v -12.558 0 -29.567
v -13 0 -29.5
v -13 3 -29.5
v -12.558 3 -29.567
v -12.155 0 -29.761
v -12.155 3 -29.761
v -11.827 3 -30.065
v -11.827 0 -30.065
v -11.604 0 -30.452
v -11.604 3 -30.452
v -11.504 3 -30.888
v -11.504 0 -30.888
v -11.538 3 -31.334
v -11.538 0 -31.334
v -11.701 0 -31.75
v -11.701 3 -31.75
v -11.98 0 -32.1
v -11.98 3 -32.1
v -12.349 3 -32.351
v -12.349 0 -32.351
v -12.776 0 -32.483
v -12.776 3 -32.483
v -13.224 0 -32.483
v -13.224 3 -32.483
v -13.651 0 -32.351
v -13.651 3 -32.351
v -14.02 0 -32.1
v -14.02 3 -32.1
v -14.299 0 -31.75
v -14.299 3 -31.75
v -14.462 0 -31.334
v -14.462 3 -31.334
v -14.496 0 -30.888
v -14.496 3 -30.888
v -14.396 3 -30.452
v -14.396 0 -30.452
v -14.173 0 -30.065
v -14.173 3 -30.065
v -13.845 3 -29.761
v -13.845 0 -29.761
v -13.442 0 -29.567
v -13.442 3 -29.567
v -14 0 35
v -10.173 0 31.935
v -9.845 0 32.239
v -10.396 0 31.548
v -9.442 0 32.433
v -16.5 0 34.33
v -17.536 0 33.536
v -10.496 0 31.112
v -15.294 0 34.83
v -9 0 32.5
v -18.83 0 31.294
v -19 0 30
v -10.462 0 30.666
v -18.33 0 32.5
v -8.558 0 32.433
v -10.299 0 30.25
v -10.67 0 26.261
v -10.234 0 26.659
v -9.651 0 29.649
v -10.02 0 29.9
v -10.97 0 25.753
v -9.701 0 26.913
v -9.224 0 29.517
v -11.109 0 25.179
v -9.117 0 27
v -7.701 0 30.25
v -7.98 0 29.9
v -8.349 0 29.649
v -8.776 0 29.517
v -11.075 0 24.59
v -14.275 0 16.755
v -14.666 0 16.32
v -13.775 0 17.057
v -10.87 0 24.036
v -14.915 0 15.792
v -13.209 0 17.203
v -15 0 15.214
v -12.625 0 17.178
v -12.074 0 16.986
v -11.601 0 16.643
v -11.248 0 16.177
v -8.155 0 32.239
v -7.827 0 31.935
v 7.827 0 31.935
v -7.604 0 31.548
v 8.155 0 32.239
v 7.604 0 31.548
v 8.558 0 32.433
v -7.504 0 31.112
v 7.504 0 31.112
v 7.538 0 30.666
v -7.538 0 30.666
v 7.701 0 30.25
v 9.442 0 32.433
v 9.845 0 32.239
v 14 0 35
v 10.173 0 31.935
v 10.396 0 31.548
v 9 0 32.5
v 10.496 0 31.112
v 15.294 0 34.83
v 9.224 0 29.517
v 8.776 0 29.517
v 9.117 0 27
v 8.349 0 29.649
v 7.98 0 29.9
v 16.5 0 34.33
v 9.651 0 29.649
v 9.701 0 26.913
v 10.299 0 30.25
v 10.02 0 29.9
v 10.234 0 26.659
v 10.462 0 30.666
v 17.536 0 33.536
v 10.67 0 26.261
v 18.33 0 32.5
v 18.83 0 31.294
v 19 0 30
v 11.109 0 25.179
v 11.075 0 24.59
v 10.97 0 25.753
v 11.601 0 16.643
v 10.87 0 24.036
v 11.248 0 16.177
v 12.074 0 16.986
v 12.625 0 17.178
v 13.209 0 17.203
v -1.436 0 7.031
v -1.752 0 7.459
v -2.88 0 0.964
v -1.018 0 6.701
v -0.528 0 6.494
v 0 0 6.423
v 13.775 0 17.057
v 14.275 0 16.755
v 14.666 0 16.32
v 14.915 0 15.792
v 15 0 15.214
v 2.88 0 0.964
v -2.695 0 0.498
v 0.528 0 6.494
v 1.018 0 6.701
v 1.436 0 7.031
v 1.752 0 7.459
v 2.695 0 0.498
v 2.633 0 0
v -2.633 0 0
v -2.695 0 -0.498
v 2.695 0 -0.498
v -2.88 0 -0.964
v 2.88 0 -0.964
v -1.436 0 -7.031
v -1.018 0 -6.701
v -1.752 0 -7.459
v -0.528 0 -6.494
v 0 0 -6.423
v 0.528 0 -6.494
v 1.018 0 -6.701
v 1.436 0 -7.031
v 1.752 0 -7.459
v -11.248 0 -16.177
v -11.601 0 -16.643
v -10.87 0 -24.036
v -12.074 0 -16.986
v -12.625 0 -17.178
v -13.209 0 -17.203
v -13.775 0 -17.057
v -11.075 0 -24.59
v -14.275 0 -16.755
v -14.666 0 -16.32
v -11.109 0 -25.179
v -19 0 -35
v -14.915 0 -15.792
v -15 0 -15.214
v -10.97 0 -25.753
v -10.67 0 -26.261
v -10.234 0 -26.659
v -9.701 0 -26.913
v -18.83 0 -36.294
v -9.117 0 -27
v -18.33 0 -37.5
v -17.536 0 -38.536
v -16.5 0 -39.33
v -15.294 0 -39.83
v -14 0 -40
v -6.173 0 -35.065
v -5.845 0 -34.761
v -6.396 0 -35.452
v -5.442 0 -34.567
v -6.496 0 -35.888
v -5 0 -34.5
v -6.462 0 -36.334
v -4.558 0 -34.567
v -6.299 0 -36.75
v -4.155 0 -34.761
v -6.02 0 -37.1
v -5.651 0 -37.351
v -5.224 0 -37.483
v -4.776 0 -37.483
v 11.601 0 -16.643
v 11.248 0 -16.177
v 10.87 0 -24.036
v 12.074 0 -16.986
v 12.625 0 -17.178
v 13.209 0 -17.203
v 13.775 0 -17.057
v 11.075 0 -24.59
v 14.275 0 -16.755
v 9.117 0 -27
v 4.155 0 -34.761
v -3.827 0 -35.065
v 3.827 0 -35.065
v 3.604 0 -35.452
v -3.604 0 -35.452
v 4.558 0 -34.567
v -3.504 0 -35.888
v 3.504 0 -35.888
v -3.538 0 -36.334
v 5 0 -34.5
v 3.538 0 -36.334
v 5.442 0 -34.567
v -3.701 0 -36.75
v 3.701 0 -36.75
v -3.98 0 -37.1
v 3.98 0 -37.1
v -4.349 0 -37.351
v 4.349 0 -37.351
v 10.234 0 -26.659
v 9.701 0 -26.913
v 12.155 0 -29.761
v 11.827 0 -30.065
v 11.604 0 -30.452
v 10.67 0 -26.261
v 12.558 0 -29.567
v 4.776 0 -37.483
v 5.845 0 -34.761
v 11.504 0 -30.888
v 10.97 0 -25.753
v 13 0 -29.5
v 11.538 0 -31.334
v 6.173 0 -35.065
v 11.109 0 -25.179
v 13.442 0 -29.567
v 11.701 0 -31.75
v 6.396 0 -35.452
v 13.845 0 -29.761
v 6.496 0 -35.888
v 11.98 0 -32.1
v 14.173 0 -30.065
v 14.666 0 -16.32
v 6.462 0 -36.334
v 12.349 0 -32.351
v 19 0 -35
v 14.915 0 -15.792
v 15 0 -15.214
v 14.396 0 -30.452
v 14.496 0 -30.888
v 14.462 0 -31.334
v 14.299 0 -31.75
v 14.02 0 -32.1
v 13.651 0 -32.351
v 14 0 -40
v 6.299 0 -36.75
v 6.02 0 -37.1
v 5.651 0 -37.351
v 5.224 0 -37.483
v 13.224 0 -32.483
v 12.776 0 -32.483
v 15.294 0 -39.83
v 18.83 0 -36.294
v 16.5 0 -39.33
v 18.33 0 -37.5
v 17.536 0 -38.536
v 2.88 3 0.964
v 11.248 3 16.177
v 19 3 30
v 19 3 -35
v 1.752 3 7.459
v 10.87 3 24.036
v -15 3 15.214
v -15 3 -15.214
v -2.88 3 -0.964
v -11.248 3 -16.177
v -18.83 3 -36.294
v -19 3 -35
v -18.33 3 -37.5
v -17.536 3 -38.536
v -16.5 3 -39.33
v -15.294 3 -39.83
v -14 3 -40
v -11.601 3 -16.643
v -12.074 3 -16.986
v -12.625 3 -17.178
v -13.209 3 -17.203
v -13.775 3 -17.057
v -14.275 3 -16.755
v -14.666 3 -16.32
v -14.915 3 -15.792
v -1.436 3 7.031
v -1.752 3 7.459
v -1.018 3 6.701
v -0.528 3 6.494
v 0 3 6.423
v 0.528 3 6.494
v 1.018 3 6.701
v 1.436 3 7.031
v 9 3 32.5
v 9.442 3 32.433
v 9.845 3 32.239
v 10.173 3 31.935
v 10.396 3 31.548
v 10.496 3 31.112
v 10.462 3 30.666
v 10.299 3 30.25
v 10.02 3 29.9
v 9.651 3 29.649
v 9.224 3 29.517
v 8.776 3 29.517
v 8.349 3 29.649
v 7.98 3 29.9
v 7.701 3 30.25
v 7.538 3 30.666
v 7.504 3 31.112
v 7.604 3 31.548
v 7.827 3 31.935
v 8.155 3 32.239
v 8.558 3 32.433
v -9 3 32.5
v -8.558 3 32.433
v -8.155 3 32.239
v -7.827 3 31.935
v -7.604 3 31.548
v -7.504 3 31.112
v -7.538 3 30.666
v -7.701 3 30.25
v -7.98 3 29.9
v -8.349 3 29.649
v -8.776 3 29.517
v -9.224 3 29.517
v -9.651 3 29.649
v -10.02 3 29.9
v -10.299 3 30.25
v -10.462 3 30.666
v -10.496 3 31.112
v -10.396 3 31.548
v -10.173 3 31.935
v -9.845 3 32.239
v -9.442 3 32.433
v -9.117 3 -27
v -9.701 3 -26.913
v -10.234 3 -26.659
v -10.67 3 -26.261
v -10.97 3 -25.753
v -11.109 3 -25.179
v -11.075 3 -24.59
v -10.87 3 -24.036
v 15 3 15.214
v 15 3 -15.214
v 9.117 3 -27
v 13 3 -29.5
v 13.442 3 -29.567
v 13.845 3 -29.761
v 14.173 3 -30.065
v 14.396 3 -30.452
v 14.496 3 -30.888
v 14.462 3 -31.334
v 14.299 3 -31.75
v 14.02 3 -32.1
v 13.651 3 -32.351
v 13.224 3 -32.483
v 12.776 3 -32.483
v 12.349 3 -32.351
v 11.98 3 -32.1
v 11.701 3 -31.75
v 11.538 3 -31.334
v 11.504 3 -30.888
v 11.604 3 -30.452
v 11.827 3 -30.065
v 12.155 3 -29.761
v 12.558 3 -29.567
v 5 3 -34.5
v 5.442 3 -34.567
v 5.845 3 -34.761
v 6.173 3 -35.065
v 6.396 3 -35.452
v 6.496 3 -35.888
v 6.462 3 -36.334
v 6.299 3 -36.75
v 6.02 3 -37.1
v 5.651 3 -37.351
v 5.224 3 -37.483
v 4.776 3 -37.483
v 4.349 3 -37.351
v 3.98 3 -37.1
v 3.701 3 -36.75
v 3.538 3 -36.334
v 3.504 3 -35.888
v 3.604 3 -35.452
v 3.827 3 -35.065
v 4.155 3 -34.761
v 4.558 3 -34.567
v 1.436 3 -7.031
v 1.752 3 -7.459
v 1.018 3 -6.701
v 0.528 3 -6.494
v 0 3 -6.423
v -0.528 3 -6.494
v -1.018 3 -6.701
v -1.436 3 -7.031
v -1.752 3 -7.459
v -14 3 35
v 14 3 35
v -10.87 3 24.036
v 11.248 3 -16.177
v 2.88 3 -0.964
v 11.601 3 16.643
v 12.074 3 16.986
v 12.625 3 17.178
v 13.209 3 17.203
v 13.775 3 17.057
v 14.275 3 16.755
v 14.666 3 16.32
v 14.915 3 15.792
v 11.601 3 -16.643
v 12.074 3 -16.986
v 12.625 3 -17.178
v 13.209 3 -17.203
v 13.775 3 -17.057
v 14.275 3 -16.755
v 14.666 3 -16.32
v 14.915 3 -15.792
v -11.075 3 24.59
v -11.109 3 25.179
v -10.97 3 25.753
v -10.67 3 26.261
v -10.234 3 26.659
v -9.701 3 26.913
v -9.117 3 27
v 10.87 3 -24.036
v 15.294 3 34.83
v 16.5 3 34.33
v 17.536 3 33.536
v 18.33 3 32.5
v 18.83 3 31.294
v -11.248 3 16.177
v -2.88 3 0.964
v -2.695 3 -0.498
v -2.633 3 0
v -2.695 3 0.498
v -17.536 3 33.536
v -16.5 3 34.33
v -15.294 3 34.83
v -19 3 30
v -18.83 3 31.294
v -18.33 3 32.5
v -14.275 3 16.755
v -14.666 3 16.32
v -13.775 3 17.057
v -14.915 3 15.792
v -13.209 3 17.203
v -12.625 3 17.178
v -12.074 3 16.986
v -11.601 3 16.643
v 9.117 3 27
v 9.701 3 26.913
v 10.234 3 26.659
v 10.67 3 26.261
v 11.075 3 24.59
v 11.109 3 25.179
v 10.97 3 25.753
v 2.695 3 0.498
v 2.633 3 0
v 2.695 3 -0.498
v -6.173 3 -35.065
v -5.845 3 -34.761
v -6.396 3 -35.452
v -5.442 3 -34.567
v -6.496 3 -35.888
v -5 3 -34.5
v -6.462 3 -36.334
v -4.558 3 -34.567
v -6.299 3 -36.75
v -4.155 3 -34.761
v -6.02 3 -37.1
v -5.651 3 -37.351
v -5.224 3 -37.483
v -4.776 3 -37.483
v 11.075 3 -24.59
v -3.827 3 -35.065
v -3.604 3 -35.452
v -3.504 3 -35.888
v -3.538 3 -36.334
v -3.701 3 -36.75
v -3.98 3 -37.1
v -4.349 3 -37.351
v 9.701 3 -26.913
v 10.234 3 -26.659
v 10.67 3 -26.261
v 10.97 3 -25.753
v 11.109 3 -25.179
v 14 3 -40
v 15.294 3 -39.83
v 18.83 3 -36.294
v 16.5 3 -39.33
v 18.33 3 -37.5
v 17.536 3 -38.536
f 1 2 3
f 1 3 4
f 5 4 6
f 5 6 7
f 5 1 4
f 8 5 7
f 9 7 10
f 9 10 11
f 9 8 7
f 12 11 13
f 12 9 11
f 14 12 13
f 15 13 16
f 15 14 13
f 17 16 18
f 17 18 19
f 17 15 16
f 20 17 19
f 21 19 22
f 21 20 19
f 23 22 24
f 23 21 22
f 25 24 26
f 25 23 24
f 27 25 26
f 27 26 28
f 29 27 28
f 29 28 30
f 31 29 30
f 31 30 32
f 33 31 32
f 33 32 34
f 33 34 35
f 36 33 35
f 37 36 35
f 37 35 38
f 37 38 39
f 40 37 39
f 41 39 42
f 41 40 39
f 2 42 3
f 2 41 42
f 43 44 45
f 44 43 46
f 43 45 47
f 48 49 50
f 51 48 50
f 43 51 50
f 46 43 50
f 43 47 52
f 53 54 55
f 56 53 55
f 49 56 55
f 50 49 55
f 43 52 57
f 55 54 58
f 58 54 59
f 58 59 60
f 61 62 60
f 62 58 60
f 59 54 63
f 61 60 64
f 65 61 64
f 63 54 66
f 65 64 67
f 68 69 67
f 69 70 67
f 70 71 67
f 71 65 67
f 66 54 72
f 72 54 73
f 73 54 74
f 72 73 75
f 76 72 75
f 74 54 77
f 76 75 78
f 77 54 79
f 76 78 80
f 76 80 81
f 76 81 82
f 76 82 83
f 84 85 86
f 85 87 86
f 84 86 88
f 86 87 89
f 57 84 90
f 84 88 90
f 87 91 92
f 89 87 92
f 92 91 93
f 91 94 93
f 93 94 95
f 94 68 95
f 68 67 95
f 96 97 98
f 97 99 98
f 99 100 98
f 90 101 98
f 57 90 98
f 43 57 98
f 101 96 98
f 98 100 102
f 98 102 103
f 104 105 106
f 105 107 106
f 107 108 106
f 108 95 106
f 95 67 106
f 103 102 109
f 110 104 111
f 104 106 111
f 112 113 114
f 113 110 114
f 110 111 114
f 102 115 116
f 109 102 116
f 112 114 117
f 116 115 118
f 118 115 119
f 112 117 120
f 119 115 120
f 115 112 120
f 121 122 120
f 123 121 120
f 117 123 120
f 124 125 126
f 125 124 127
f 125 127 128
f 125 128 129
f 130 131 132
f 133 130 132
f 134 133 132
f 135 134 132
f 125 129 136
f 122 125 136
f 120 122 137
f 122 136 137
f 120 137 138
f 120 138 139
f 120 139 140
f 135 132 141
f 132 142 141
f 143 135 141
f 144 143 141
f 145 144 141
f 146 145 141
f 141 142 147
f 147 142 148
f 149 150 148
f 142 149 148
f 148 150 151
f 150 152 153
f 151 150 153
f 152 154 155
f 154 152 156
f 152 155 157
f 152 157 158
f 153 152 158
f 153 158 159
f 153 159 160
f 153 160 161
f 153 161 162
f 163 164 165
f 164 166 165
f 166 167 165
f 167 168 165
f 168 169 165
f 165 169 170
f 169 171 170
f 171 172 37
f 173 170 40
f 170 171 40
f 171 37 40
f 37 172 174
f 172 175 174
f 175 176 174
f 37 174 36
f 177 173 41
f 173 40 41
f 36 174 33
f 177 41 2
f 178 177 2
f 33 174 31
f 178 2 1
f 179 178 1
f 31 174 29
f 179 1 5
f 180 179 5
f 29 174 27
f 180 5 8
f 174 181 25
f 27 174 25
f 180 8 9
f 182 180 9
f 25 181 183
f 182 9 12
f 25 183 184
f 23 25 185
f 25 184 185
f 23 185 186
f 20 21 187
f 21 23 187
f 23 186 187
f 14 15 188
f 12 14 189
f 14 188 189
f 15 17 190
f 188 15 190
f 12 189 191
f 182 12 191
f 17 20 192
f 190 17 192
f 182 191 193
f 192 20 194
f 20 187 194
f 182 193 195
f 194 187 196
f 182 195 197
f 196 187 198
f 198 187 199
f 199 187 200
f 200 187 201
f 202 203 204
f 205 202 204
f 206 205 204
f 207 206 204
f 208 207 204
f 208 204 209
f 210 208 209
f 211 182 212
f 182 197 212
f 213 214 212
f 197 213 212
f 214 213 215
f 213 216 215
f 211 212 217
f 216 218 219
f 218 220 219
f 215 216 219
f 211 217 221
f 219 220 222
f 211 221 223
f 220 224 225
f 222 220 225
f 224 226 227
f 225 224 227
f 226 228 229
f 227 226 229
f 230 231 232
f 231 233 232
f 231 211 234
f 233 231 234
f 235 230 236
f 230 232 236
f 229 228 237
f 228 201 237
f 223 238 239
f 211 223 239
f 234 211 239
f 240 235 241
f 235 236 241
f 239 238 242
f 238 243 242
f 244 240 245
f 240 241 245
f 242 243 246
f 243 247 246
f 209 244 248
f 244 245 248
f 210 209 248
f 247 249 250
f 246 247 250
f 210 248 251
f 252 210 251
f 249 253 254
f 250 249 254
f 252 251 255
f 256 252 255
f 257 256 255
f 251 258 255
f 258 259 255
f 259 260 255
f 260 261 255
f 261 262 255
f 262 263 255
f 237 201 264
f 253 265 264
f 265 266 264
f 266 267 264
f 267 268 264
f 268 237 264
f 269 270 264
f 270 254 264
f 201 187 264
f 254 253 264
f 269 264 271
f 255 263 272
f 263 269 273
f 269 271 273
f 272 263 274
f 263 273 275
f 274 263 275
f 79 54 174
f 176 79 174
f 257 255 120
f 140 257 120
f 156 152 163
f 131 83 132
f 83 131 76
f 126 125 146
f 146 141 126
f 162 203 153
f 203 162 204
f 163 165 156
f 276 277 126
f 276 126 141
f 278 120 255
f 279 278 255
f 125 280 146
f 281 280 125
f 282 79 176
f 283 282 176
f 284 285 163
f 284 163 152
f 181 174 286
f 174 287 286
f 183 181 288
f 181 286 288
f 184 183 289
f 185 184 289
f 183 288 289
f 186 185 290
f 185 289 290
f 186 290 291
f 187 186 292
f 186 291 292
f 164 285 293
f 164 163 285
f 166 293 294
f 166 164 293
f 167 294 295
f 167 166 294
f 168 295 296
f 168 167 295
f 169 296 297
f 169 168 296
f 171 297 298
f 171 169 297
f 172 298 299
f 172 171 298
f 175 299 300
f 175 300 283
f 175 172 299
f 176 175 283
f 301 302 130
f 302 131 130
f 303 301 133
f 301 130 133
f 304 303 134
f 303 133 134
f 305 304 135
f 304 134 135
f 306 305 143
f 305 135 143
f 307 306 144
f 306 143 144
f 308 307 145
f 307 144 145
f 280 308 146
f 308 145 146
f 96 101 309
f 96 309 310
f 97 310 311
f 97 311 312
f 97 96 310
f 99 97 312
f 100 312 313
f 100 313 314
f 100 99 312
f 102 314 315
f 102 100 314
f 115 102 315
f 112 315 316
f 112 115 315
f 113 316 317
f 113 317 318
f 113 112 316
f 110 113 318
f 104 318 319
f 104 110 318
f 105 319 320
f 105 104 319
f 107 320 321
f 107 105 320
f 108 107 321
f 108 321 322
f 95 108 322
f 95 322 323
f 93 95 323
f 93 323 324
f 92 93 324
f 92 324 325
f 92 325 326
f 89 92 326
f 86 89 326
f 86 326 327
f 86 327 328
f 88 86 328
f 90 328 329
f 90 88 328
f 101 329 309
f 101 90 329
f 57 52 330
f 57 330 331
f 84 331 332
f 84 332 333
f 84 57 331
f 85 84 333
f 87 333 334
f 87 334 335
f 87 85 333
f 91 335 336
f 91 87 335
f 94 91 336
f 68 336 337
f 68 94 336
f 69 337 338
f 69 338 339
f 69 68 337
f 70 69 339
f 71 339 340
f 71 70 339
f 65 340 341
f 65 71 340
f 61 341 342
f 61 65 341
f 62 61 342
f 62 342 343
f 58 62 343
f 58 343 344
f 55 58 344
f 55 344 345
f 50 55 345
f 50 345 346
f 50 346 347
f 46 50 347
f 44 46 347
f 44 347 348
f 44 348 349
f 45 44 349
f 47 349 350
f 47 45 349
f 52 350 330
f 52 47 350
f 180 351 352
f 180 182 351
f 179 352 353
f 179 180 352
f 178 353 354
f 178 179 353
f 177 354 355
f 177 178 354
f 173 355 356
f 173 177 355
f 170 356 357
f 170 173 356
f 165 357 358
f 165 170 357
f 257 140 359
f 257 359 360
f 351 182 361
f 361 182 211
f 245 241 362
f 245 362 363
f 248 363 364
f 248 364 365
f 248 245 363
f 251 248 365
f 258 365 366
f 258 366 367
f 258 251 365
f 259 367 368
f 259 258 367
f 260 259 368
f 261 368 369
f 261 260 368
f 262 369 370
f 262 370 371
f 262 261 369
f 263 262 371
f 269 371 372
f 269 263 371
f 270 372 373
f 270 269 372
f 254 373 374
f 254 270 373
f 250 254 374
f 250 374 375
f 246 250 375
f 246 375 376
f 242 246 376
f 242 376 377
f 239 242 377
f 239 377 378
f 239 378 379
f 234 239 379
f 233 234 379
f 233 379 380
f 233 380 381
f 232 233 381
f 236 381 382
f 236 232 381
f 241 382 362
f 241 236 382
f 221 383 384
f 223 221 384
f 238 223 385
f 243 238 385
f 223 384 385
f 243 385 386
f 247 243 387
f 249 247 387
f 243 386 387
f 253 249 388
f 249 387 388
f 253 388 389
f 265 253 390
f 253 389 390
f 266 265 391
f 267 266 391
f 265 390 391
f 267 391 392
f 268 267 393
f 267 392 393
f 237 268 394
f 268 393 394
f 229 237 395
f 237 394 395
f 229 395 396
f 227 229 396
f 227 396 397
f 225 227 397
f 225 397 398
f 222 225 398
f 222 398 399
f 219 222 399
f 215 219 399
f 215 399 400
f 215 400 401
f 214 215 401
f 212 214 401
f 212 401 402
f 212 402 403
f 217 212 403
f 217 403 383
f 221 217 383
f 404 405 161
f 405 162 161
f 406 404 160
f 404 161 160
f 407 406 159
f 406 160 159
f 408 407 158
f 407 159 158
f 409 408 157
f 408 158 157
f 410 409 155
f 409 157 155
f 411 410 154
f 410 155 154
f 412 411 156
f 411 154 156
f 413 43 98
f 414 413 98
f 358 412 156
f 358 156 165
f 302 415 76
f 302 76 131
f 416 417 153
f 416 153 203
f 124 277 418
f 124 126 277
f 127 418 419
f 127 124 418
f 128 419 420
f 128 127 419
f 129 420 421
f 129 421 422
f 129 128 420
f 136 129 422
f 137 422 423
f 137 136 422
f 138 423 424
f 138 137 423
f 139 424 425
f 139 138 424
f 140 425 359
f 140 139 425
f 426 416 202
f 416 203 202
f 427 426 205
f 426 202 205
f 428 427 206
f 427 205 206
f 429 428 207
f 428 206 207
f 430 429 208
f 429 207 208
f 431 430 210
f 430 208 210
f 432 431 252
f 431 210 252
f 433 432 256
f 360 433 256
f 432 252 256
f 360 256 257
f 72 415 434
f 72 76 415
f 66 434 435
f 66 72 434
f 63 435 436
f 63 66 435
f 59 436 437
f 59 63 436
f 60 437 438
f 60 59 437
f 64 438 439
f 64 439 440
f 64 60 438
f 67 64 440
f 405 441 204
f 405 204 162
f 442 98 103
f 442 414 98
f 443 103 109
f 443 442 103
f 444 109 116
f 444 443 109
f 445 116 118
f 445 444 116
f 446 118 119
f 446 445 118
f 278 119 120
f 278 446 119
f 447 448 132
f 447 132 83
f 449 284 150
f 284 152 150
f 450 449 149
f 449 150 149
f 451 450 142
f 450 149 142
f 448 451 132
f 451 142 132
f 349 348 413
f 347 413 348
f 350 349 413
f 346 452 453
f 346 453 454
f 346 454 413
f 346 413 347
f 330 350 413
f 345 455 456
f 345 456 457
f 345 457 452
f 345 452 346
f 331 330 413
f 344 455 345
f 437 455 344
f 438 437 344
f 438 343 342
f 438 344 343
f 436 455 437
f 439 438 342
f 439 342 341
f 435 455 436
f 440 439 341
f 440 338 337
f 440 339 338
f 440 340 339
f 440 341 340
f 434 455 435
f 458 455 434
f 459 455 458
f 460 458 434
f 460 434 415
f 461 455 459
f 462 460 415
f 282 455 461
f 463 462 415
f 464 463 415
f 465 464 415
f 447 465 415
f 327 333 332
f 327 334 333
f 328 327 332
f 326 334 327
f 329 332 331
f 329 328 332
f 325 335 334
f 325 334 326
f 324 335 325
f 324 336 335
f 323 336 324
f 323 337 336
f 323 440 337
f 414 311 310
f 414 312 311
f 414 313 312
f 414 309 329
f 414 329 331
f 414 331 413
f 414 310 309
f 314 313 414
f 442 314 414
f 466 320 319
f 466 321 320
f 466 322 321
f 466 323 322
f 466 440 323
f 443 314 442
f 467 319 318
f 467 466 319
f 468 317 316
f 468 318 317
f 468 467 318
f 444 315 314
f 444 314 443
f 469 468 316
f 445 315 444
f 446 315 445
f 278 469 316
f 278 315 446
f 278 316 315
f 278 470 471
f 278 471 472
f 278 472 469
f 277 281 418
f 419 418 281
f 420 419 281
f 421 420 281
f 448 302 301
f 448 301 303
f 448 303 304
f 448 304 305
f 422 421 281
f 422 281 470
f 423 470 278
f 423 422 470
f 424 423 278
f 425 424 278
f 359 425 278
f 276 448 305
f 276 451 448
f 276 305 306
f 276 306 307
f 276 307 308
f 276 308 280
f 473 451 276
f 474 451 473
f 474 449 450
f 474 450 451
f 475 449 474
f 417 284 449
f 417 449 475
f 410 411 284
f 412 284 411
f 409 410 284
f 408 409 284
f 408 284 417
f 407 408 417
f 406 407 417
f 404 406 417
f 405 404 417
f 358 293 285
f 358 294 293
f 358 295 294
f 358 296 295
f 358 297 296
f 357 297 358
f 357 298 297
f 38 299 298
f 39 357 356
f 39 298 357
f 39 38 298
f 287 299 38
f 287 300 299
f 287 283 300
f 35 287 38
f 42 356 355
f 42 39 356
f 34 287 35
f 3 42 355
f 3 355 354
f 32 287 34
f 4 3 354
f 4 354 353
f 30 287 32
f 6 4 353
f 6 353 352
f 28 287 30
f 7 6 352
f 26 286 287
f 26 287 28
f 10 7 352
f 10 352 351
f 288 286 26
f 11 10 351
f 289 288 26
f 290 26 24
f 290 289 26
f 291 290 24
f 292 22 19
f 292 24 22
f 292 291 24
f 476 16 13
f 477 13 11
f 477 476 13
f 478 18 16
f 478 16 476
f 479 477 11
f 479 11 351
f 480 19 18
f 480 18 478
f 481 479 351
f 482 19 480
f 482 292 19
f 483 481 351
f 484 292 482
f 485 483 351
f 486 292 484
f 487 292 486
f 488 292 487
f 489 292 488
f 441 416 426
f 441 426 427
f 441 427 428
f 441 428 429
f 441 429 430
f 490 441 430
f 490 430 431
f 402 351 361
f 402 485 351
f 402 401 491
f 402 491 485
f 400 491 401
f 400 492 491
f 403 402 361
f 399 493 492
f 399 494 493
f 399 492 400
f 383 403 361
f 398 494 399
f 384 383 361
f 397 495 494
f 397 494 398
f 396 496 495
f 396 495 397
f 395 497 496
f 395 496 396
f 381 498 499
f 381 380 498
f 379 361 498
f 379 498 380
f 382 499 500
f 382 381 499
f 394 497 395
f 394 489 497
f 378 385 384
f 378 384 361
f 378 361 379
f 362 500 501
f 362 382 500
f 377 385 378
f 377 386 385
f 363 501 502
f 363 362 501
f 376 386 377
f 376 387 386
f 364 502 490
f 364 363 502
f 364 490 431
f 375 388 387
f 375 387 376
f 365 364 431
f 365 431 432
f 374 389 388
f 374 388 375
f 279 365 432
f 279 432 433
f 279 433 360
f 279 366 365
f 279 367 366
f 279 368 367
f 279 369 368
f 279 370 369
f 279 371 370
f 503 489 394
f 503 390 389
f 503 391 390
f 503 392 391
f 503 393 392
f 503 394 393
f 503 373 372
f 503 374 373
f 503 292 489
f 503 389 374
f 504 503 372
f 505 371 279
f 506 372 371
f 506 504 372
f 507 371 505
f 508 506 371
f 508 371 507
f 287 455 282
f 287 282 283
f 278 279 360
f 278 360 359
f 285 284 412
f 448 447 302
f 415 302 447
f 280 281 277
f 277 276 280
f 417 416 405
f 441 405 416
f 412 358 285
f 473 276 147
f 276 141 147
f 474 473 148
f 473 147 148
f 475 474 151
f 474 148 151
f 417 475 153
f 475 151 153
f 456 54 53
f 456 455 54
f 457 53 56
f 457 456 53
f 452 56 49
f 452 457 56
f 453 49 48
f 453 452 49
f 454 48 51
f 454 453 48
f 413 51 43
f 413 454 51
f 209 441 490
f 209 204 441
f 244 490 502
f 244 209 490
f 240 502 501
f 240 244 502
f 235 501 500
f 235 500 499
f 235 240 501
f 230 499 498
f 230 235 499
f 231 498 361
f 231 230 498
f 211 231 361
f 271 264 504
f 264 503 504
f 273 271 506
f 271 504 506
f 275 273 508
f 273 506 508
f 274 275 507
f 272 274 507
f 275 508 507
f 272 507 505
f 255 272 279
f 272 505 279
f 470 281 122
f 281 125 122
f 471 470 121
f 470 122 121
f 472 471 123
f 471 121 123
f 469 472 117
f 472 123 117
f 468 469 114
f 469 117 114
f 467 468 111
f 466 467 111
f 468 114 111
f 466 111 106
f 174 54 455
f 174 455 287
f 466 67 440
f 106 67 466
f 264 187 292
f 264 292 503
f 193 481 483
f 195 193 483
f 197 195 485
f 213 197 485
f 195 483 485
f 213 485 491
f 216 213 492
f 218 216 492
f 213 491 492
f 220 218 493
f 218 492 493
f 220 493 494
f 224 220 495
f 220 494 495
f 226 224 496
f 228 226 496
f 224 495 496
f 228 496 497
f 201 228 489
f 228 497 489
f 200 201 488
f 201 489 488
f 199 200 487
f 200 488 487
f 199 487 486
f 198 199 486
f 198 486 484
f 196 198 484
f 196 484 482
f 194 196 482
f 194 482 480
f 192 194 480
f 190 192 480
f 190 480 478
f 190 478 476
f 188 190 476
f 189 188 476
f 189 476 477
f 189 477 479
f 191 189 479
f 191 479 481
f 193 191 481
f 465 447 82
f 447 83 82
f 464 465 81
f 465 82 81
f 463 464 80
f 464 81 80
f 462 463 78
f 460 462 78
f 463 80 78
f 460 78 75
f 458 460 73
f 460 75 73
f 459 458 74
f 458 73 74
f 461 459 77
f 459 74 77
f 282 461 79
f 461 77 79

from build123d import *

# Parameters (mm, degrees)
SKETCH_1_W          = 38
SKETCH_1_H          = 70
SKETCH_1_R          = 1.5
SKETCH_1_W_2        = 30
SKETCH_1_H_2        = 54
SKETCH_1_H_3        = 5
EXTRUDE_1_DEPTH     = 3
EXTRUDE_2_DEPTH     = 3
FILLET_1_R          = 2
SKETCH_4_R          = 1.5
CUT_EXTRUDE_1_DEPTH = 10
FILLET_2_R          = 5


with BuildPart() as part:
    # 草图1 → 凸台-拉伸1 (new body)
    # profile 1 of 2: a face of its own
    with BuildSketch(Plane(origin=(0, 0, 0), x_dir=(1, 0, 0), z_dir=(0, 1, 0))):
        Rectangle(SKETCH_1_W, SKETCH_1_H)
        with Locations(Location((13, 31, 0), (0, 0, 270))):
            Circle(SKETCH_1_R, mode=Mode.SUBTRACT)
        with Locations(Location((-13, 31, 0), (0, 0, 270))):
            Circle(SKETCH_1_R, mode=Mode.SUBTRACT)
        with Locations(Location((9, -31, 0), (0, 0, 270))):
            Circle(SKETCH_1_R, mode=Mode.SUBTRACT)
        with Locations(Location((-9, -31, 0), (0, 0, 270))):
            Circle(SKETCH_1_R, mode=Mode.SUBTRACT)
        Rectangle(SKETCH_1_W_2, SKETCH_1_H_2, mode=Mode.SUBTRACT)
    # profile 2 of 2: a face of its own
    with BuildSketch(Plane(origin=(0, 0, 0), x_dir=(1, 0, 0), z_dir=(0, 1, 0))):
        with Locations((0, 37.5)):
            Rectangle(SKETCH_1_W, SKETCH_1_H_3)
    extrude(amount=EXTRUDE_1_DEPTH)

    # 草图2 → 凸台-拉伸2 (add)
    with BuildSketch(Plane(origin=(0, 3, 0), x_dir=(1, 0, 0), z_dir=(0, 1, 0))):
        Polygon((15, 27), (12.5, 27), (0, 4.272727273), (-12.5, 27), (-15, 27), (-15, 23), (-2.35, 0), (-15, -23), (-15, -27), (-12.5, -27), (0, -4.272727273), (12.5, -27), (15, -27), (15, -23), (2.35, 0), (15, 23), align=None)
    extrude(amount=-EXTRUDE_2_DEPTH)

    # 圆角1
    fillet_1_edges = [part.edges().sort_by_distance(p)[0] for p in [
        (-2.35, 1.5, 0),
        (-15, 1.5, -23),
        (-12.5, 1.5, -27),
        (0, 1.5, -4.272727273),
        (12.5, 1.5, -27),
        (15, 1.5, -23),
        (2.35, 1.5, 0),
        (15, 1.5, 23),
        (12.5, 1.5, 27),
        (0, 1.5, 4.272727273),
        (-12.5, 1.5, 27),
        (-15, 1.5, 23),
    ]]
    fillet(fillet_1_edges, radius=FILLET_1_R)

    # 草图4 → 切除-拉伸1 (cut)
    with BuildSketch(Plane(origin=(0, 3, 0), x_dir=(1, 0, 0), z_dir=(0, 1, 0))):
        with Locations(Location((-5, 36, 0), (0, 0, 270))):
            Circle(SKETCH_4_R)
        with Locations(Location((5, 36, 0), (0, 0, 270))):
            Circle(SKETCH_4_R)
    extrude(amount=-CUT_EXTRUDE_1_DEPTH, mode=Mode.SUBTRACT)

    # 圆角2
    fillet_2_edges = [part.edges().sort_by_distance(p)[0] for p in [
        (-19, 1.5, 35),
        (-19, 1.5, -40),
        (19, 1.5, -40),
        (19, 1.5, 35),
    ]]
    fillet(fillet_2_edges, radius=FILLET_2_R)


solid = part.part
